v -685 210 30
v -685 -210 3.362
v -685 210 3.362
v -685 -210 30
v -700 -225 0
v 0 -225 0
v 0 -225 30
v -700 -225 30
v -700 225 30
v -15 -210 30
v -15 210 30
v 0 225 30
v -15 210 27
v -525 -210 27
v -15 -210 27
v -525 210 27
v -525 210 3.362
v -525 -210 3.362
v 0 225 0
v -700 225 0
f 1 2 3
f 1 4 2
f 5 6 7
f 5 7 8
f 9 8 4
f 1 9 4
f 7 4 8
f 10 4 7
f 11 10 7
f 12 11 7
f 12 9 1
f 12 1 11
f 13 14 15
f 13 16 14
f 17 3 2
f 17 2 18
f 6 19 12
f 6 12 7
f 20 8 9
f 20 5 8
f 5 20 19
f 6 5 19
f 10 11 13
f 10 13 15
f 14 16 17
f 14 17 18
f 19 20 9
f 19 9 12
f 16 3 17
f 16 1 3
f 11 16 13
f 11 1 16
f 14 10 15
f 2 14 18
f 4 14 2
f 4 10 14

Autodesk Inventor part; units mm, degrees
ref_plane "YZ Plane" through (0, 0, 0) normal (1, 0, 0) x (0, 1, 0)
ref_plane "XZ Plane" through (0, 0, 0) normal (0, 1, 0) x (-1, 0, 0)
ref_plane "XY Plane" through (0, 0, 0) normal (0, 0, 1) x (1, 0, 0)
sketch "Sketch1" plane through (0, 0, 0) normal (0, 0, 1) x (1, 0, 0)
  line L0 (0, 225) -> (0, -225)
  line L1 (0, -225) -> (-700, -225)
  line L2 (-700, -225) -> (-700, 225)
  line L3 (-700, 225) -> (0, 225)
  point P0 (0, 0)
extrude "Extrusion1" add sketch "Sketch1" along normal blind 30
sketch "Sketch2" plane through (0, 0, 30) normal (0, 0, 1) x (1, 0, 0)
  line L0 (0, -225) -> (-700, -225) projected
  line L1 (0, 225) -> (0, -225) projected
  line L2 (-700, 225) -> (0, 225) projected
  line L3 (-700, -225) -> (-700, 225) projected
  line L4 (-15, 210) -> (-15, -210)
  line L5 (-15, -210) -> (-685, -210)
  line L6 (-685, -210) -> (-685, 210)
  line L7 (-685, 210) -> (-15, 210)
  point P0 (0, 0)
  dimension "d2" = 15
extrude "Extrusion2" cut sketch "Sketch2" against normal blind 3 contours L4 L5 L6 L7
sketch "Sketch3" plane through (0, 0, 27) normal (0, 0, 1) x (1, 0, 0)
  line L0 (-15, 210) -> (-685, 210) projected
  line L1 (-685, 210) -> (-685, -210) projected
  line L2 (-685, -210) -> (-15, -210) projected
  line L3 (-525, 210) -> (-525, -210)
  point P0 (0, 0)
  dimension "d5" = 160
extrude "Extrusion3" cut sketch "Sketch3" against normal blind 23.6375
properties part number "CatcherBox"
